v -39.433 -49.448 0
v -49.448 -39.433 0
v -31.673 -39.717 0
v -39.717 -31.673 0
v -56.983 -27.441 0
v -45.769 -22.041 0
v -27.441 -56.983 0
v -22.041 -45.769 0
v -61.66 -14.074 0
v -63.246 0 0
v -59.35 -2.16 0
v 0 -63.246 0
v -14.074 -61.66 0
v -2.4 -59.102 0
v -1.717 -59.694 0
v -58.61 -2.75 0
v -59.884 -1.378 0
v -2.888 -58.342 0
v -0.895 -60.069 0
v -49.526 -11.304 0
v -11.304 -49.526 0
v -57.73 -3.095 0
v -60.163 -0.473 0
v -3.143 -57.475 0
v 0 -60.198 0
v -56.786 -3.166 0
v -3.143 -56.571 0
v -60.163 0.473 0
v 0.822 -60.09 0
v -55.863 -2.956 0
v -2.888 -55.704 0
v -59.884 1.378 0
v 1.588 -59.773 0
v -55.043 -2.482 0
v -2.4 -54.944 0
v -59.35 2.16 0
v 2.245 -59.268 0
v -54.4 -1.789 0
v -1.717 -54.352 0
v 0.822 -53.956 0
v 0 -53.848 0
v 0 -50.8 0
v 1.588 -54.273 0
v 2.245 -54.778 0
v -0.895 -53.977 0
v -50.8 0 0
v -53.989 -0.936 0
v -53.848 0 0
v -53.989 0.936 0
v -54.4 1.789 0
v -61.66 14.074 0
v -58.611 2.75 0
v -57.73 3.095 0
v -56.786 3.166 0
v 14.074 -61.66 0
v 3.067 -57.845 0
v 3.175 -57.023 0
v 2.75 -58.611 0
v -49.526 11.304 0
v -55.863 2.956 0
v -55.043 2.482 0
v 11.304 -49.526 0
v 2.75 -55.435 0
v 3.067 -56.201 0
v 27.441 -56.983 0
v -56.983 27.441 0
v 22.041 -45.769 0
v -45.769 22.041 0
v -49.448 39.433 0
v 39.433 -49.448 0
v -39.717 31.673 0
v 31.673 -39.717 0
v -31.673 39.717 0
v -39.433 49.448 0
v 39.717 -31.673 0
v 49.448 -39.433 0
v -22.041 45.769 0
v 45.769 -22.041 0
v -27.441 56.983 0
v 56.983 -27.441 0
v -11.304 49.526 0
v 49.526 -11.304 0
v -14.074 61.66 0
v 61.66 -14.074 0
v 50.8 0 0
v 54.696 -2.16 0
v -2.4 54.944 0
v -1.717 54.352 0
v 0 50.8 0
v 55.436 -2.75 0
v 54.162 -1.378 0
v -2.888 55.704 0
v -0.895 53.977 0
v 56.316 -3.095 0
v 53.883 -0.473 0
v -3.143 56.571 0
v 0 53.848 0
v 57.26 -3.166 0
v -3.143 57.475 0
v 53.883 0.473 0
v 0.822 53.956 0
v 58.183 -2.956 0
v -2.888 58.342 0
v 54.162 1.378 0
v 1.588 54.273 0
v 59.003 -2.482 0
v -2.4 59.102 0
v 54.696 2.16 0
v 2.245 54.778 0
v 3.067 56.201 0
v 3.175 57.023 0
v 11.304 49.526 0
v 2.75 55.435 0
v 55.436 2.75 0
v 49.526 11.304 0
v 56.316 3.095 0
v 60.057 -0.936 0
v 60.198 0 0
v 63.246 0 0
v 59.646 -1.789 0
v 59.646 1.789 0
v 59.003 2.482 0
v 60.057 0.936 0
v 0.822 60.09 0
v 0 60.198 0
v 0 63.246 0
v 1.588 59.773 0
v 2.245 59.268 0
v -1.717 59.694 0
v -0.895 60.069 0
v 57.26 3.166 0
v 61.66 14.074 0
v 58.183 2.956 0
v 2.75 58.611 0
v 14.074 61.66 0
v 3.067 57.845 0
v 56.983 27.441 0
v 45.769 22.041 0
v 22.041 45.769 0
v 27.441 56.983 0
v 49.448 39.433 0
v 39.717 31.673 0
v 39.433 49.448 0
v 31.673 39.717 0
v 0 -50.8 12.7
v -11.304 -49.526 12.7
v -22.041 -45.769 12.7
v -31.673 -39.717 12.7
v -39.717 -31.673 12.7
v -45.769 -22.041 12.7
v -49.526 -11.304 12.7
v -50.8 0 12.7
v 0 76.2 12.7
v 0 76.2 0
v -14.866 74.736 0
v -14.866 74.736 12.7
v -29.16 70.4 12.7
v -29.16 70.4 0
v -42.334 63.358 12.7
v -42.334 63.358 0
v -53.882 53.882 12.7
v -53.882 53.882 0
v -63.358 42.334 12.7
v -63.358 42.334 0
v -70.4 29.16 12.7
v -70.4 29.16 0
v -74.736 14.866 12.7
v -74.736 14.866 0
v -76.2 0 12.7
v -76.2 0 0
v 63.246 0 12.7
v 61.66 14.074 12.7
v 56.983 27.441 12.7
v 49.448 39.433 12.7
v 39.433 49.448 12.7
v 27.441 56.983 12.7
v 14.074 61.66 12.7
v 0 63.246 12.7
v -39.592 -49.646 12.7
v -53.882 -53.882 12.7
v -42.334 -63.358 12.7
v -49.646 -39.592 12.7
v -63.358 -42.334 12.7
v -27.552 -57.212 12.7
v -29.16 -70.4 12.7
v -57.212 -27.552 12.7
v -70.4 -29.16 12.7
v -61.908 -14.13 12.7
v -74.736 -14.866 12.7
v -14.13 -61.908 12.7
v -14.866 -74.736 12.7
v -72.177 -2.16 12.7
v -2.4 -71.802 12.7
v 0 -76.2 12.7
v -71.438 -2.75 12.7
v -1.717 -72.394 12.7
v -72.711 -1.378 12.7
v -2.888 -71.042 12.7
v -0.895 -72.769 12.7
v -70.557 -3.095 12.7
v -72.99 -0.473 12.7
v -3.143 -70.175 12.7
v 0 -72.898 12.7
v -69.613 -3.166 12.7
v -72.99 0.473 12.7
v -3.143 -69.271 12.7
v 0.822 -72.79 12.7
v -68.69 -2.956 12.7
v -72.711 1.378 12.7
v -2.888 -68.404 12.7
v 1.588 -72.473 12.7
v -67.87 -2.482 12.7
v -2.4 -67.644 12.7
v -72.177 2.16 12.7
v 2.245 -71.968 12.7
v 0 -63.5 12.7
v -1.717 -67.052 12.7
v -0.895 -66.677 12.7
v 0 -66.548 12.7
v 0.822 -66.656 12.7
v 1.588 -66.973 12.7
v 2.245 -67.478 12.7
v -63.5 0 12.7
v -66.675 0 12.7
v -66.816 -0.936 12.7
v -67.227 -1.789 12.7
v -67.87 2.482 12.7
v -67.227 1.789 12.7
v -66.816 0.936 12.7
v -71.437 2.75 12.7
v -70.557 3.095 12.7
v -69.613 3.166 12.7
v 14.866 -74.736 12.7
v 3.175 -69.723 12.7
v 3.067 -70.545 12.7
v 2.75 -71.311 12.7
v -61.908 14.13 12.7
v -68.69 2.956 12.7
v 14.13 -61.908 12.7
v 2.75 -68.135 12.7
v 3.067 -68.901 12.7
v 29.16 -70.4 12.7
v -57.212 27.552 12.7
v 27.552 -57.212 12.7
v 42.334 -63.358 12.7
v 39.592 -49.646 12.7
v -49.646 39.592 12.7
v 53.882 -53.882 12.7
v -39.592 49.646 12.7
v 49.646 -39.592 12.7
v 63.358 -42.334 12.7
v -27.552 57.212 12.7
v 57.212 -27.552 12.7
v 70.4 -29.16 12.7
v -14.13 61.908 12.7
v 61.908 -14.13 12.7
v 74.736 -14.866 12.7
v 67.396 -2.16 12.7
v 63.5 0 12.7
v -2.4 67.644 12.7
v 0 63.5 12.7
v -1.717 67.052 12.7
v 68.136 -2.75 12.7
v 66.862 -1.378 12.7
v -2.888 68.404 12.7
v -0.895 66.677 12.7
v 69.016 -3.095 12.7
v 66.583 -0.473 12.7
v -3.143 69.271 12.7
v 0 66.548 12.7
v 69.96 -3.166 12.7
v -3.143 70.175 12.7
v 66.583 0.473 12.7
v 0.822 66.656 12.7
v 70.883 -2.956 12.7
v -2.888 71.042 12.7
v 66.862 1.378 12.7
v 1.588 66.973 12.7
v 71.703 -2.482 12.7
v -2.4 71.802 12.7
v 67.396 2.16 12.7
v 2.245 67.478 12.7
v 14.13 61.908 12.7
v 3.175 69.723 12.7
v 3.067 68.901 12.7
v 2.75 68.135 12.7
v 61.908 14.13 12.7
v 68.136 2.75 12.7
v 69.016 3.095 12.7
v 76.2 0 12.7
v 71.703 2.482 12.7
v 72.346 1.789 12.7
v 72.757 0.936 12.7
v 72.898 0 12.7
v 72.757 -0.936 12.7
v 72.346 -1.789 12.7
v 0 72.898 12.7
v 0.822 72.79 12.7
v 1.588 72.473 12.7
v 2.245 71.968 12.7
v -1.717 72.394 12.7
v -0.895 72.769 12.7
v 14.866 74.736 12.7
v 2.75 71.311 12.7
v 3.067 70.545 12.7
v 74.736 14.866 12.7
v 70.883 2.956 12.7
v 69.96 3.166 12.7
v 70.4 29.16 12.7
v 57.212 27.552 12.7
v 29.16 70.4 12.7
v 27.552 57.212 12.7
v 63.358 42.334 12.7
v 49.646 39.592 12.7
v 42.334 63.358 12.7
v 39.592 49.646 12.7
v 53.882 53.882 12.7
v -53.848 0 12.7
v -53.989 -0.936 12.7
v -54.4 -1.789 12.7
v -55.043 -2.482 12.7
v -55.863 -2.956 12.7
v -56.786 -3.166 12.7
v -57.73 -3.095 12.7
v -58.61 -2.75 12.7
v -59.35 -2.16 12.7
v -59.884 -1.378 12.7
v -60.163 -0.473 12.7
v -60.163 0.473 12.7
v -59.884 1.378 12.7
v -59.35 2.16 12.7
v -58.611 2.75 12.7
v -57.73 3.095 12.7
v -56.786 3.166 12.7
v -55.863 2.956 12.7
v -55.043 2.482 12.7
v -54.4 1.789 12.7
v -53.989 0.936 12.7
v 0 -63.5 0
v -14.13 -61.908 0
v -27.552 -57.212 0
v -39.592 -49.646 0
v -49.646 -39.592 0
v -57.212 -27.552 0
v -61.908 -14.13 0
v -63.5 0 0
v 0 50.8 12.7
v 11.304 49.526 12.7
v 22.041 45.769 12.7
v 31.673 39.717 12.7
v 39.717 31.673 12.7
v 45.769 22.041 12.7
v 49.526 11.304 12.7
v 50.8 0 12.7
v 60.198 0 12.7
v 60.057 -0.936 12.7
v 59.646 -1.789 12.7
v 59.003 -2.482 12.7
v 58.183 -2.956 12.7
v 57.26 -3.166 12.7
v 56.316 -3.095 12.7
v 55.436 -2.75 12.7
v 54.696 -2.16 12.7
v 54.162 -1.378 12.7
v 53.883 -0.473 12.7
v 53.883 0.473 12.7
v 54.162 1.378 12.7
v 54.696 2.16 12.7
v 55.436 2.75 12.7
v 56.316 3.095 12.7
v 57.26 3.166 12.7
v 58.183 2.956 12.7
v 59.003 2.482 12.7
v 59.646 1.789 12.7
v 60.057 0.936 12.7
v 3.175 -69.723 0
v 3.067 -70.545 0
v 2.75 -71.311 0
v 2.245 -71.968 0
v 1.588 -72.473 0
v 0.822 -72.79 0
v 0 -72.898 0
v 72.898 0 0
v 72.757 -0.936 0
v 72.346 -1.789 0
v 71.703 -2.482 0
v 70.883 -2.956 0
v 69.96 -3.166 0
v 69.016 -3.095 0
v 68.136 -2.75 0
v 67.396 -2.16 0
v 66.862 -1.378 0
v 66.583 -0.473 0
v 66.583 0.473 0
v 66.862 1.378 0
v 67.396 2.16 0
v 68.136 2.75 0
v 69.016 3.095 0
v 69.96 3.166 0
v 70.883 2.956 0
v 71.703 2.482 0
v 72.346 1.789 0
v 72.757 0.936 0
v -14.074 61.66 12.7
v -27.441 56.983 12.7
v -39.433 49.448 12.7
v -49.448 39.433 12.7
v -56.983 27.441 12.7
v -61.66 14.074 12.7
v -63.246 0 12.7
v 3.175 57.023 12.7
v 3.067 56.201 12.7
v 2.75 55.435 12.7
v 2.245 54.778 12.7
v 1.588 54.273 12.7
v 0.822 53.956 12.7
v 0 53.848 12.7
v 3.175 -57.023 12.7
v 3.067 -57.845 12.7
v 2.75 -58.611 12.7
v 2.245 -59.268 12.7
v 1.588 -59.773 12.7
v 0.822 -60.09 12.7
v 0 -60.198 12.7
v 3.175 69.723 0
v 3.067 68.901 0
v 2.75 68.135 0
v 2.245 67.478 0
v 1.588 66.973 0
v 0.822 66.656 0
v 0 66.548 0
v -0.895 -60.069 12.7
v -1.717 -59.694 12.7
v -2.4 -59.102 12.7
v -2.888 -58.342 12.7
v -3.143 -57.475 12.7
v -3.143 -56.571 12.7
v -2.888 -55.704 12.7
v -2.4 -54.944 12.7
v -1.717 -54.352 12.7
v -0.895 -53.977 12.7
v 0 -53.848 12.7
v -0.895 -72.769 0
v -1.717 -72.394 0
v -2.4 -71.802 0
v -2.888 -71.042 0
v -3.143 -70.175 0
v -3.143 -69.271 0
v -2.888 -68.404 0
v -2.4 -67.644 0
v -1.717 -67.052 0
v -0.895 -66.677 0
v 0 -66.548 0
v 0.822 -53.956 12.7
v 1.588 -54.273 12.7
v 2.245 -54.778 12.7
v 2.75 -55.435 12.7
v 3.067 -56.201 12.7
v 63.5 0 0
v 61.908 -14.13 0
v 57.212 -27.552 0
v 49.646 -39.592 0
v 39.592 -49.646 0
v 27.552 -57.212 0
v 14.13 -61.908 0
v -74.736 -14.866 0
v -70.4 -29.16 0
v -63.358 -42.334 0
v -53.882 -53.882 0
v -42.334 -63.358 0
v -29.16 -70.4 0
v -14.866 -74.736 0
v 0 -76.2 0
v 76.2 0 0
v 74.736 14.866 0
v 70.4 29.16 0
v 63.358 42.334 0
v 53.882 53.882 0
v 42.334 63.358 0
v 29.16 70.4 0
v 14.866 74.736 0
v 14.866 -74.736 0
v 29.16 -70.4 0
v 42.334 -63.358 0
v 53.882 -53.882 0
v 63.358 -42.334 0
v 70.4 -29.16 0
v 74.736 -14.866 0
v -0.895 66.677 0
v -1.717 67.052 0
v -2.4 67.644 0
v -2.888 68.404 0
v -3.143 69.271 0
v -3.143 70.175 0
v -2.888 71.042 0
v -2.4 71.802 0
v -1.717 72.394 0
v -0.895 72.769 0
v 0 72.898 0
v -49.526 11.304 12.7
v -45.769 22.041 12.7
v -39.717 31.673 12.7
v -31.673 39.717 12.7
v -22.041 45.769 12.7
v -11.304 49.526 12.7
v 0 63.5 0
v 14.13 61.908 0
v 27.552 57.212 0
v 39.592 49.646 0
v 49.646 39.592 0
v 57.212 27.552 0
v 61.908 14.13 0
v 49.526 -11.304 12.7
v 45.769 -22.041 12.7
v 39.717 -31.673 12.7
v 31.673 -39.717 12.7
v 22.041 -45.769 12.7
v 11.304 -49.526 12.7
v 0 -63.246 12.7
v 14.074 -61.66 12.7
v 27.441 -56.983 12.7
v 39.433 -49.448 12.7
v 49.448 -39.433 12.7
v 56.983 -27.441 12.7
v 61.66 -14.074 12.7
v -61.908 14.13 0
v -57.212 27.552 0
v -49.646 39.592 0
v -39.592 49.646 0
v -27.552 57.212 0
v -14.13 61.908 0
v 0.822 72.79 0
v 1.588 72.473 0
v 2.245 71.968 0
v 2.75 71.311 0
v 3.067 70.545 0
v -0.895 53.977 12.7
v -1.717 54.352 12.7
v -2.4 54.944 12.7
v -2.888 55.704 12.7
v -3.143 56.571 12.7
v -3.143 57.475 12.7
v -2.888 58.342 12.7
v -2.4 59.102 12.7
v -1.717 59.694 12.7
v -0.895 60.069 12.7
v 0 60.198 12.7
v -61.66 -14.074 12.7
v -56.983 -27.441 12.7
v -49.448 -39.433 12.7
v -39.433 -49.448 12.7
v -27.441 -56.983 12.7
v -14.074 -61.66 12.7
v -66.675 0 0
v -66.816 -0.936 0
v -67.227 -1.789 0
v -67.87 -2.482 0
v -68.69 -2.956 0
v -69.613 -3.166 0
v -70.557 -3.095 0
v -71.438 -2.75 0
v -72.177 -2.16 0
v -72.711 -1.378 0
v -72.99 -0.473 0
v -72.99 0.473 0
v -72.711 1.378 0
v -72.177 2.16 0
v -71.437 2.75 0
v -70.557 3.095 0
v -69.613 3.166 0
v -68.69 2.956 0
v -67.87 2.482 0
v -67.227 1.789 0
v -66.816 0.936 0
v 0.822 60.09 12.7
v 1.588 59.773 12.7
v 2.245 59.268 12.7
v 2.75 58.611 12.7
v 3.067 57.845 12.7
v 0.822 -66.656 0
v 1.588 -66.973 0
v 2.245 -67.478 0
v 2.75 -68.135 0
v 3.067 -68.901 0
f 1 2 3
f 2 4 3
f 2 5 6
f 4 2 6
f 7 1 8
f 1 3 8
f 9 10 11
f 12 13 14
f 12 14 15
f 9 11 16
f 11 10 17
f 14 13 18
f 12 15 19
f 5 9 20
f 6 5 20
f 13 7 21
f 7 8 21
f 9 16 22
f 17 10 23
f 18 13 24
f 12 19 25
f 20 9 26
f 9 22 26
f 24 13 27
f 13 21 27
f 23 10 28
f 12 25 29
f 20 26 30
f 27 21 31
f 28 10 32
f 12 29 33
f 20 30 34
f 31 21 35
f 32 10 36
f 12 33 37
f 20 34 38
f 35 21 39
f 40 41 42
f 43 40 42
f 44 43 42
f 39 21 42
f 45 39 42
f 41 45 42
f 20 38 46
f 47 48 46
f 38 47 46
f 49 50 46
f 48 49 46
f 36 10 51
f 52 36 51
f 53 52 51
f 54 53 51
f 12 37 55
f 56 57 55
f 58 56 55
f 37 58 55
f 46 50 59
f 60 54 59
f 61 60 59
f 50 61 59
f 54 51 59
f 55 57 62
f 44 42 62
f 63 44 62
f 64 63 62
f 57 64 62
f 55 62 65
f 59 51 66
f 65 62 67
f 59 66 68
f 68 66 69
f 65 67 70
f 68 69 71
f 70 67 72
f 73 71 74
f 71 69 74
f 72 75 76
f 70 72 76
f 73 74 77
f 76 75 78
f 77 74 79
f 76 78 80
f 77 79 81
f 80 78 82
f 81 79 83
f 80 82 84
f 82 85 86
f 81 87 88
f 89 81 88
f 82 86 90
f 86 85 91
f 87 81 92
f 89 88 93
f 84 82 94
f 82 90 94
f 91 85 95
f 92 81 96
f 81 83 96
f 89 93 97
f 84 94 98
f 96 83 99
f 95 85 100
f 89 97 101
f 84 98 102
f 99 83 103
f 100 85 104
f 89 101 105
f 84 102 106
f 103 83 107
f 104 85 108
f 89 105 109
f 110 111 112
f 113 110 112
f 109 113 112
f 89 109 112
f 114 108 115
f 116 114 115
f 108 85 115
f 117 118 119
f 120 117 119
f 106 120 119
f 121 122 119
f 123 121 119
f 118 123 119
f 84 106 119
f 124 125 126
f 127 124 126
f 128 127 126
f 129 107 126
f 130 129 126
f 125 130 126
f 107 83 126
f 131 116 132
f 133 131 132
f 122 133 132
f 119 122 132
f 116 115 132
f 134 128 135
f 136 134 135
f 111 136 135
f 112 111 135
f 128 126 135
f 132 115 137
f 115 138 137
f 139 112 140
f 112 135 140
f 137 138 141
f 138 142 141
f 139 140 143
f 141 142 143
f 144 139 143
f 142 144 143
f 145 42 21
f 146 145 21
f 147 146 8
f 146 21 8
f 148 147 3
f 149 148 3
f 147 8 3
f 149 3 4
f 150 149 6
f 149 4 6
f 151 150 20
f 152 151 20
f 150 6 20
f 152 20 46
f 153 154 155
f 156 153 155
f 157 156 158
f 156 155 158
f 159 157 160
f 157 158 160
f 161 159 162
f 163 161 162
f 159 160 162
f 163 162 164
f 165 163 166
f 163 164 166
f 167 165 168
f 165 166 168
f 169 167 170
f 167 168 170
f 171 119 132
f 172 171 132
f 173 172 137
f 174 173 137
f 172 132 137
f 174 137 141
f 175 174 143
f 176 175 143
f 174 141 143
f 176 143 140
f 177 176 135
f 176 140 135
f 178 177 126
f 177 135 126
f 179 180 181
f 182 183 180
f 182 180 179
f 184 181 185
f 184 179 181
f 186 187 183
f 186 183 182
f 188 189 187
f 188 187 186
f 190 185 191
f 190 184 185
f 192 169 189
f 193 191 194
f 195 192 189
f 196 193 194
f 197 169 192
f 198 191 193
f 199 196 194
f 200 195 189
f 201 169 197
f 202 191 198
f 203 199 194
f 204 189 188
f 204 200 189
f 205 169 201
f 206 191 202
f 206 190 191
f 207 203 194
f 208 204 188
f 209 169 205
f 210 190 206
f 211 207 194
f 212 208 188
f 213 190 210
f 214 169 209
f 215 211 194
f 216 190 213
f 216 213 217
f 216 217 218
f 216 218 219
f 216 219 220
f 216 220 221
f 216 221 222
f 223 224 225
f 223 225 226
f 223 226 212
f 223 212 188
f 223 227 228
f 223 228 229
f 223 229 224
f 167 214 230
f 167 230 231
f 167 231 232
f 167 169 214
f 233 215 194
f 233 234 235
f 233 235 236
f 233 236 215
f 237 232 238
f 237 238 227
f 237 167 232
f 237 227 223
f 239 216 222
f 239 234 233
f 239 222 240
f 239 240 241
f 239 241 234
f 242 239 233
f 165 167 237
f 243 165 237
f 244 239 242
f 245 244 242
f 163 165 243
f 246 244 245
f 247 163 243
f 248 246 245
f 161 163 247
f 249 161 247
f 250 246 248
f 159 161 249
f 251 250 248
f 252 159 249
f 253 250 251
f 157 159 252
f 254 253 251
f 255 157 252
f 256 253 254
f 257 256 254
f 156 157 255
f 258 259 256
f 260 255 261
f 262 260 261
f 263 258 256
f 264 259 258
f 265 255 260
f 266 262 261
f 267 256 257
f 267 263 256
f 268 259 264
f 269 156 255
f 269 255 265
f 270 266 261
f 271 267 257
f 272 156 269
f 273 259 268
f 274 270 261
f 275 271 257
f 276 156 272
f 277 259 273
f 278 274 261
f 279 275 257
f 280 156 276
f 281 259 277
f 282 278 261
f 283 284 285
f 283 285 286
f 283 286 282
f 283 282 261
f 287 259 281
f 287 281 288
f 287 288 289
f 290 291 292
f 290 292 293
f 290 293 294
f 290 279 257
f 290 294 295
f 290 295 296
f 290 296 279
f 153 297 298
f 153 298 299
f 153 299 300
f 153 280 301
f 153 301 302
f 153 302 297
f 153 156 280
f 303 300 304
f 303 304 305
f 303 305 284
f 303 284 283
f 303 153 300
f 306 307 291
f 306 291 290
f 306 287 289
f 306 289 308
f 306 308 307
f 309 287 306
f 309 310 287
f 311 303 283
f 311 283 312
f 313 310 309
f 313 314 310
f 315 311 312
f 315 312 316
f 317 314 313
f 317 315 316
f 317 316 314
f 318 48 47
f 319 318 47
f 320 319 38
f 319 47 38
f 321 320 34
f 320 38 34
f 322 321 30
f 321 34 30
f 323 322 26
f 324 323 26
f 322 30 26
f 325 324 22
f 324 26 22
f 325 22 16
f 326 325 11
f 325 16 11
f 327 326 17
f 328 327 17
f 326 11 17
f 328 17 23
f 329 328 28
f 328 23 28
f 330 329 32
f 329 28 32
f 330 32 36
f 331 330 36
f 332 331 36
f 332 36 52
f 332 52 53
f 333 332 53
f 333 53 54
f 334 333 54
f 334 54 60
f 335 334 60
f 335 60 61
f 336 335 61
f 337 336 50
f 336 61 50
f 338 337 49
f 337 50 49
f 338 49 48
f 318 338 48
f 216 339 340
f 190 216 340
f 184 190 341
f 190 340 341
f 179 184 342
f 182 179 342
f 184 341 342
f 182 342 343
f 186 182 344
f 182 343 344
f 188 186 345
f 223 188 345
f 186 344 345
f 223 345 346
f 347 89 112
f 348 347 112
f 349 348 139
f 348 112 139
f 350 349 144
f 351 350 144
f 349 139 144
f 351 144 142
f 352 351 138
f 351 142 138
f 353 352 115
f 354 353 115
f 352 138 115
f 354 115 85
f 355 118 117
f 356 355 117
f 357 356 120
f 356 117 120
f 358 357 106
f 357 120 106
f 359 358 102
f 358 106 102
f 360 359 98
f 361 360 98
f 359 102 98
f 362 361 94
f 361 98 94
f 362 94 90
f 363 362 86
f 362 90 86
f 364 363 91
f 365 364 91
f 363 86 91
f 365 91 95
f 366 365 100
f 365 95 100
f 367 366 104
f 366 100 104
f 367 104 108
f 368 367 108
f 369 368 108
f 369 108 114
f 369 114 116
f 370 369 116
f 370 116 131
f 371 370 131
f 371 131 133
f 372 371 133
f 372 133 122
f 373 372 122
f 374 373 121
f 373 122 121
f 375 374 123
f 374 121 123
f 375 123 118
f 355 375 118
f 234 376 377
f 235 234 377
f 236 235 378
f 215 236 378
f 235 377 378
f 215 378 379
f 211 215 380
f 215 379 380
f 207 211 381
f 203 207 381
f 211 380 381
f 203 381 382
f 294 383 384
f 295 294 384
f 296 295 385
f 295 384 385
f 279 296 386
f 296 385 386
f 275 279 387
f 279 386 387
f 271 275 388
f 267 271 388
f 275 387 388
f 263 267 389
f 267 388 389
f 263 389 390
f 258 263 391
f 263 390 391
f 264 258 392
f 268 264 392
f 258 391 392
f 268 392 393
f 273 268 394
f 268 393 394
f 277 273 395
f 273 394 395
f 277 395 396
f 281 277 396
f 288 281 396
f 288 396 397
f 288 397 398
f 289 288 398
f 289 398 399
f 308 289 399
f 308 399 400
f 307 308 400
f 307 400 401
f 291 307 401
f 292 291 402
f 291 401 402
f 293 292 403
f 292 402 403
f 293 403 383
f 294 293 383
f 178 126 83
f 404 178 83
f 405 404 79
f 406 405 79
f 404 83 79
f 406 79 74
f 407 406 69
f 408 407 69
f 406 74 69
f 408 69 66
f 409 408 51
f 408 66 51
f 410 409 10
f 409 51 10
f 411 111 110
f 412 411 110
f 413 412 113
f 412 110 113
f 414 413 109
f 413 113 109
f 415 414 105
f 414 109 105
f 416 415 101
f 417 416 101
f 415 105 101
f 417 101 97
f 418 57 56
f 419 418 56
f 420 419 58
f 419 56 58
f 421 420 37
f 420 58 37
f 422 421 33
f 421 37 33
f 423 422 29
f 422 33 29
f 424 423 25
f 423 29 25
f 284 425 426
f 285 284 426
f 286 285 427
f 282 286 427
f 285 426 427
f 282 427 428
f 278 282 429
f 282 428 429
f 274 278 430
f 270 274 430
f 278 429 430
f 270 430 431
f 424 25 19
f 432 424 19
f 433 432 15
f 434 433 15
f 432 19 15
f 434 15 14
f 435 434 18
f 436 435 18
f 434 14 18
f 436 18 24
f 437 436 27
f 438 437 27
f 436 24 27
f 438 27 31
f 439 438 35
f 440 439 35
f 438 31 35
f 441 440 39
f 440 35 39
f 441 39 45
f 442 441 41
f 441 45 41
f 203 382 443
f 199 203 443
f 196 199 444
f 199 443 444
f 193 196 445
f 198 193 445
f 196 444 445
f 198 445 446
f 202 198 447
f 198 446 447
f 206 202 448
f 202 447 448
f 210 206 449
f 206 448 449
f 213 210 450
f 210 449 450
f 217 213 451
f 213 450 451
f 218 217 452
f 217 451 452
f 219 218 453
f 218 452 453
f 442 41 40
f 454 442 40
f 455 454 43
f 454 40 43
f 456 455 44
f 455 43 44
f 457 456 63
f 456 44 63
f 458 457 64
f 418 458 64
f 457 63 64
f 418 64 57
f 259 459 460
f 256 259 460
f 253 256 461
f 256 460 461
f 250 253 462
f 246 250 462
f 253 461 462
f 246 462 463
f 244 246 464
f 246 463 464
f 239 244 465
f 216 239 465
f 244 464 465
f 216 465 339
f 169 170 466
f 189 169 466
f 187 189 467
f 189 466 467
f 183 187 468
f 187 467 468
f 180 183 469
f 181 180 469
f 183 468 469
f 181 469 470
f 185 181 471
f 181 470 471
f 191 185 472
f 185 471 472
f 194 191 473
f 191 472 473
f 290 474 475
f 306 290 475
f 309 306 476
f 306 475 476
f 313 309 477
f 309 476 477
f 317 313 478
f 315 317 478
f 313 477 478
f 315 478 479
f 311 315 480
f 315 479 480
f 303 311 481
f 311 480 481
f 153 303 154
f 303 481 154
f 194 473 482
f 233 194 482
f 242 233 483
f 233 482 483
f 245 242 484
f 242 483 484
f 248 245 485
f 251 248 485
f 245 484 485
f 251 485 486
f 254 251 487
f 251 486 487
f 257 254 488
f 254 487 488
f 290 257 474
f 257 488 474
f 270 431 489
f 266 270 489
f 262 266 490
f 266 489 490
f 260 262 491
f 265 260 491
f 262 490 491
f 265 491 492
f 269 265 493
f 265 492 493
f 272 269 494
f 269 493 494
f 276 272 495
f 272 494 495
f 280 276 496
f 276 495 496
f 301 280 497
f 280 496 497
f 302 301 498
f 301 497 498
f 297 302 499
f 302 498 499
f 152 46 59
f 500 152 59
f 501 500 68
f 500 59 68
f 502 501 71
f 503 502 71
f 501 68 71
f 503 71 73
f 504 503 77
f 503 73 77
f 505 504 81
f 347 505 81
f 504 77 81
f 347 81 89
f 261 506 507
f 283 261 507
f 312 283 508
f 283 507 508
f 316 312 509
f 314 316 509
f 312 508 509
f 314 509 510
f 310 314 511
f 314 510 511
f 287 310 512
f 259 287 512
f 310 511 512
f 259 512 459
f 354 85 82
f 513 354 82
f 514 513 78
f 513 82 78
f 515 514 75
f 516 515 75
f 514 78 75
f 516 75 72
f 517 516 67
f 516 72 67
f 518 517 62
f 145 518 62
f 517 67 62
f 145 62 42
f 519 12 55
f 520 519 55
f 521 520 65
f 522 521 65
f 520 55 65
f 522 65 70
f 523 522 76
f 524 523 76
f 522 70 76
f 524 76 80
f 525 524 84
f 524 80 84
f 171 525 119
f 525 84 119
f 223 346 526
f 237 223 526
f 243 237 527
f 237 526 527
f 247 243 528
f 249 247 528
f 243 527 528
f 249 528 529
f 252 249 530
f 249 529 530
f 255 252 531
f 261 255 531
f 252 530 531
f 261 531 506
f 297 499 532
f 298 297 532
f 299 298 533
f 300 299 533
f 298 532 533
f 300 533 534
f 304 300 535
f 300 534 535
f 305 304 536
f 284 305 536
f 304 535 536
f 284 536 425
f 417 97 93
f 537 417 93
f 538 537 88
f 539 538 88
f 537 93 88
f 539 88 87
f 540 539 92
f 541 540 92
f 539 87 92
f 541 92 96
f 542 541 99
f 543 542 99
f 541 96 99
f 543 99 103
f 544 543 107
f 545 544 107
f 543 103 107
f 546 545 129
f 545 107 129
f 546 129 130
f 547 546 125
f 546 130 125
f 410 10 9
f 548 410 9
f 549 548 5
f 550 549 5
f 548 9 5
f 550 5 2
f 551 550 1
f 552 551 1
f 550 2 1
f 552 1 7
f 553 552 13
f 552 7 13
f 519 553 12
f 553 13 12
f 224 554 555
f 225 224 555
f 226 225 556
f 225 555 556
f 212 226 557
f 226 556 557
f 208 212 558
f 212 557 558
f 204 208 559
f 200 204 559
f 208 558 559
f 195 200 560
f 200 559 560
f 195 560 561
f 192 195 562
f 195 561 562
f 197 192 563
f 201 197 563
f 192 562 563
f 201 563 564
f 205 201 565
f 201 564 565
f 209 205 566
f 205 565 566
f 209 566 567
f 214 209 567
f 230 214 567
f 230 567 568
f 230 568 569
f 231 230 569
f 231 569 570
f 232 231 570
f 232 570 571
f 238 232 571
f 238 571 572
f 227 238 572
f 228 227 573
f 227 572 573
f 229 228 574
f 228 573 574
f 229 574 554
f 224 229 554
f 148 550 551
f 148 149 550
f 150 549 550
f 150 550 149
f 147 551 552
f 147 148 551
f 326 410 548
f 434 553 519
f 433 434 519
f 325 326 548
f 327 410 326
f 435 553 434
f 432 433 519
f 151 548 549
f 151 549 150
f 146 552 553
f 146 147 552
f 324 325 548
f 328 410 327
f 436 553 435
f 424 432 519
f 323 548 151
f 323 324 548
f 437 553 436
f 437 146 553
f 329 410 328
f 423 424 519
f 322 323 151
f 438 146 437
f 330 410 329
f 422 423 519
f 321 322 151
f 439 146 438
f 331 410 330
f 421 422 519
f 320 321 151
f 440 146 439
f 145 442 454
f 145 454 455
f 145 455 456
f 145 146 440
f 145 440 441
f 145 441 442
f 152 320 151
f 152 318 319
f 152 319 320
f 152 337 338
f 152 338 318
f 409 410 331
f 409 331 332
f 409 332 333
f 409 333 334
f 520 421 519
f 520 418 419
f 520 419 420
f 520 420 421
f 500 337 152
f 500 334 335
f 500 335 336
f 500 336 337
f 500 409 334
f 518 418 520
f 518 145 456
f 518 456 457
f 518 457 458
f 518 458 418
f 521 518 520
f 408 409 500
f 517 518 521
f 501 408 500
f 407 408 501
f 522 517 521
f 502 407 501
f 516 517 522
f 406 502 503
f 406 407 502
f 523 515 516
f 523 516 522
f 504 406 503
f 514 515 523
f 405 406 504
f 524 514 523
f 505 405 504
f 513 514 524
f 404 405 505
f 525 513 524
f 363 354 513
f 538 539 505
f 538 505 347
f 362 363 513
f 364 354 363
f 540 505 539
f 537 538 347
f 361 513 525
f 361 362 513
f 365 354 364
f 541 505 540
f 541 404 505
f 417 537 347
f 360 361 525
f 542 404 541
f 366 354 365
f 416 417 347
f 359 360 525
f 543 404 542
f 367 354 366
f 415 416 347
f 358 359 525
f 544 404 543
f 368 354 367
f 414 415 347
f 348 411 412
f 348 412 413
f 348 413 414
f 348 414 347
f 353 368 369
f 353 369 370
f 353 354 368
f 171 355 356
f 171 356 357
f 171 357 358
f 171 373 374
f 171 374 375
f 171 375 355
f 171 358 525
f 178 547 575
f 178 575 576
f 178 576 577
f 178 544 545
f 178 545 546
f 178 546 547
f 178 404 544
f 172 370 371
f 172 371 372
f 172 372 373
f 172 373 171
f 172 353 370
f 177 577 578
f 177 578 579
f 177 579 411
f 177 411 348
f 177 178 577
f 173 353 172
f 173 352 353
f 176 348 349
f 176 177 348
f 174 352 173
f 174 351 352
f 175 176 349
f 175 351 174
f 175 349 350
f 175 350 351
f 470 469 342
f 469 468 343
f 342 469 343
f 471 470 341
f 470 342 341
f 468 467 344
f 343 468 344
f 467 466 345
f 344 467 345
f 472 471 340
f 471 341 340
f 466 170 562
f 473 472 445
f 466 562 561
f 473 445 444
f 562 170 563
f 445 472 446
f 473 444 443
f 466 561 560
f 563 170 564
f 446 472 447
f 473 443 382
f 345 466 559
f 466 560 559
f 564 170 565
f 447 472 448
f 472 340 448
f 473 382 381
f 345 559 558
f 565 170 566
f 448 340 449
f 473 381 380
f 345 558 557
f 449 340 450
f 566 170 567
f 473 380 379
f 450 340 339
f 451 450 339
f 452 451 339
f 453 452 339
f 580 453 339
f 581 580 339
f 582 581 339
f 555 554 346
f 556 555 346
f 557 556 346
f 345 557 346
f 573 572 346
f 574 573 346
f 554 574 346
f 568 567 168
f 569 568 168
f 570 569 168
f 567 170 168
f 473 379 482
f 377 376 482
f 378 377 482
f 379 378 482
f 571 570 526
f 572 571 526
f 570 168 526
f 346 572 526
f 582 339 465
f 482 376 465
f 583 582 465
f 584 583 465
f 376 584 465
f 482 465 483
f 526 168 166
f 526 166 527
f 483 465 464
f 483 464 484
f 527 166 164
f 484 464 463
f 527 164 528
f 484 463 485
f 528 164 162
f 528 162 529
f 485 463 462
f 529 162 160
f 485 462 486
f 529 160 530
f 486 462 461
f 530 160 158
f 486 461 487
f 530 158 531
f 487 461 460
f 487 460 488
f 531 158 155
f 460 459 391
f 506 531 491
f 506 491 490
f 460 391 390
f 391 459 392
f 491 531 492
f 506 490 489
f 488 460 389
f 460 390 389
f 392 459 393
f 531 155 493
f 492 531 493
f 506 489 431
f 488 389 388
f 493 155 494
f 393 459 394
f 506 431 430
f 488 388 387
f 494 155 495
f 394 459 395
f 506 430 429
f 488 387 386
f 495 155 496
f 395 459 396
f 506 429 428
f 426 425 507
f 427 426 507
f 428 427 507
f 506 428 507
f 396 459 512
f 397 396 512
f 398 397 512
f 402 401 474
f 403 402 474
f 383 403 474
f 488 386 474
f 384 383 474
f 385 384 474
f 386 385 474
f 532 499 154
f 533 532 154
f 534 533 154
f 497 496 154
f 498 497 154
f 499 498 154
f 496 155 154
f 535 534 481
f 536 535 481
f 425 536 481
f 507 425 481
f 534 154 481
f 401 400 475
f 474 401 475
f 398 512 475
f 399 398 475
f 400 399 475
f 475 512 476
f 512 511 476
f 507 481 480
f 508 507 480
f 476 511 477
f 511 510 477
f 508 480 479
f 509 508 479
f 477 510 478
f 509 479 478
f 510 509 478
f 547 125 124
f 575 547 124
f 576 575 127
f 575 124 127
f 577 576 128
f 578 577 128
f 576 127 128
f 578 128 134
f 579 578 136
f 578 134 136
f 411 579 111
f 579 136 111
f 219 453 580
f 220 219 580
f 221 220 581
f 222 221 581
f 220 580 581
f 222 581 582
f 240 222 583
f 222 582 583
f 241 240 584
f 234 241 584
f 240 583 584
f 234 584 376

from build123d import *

# Parameters (mm, degrees)
F1_DEPTH = 12.7


with BuildPart() as f1:
    # F0 (on Top) → F1 (new body)
    with BuildSketch(Plane.XY):
        with BuildLine():
            Line((60.198, 0), (63.246, 0))
            ThreePointArc((63.246, 0), (44.7216754829, 44.7216754829), (0, 63.246))
            Line((0, 63.246), (0, 60.198))
            ThreePointArc((0, 60.198), (2.2450640303, 59.2680640303), (3.175, 57.023))
            ThreePointArc((3.175, 57.023), (2.2450640303, 54.7779359697), (0, 53.848))
            Line((0, 53.848), (0, 50.8))
            ThreePointArc((0, 50.8), (35.9210244843, 35.9210244843), (50.8, 0))
            Line((50.8, 0), (53.848, 0))
            ThreePointArc((53.848, 0), (57.023, 3.175), (60.198, 0))
        make_face()
        with BuildLine():
            Line((0, 60.198), (0, 63.246))
            ThreePointArc((0, 63.246), (-44.7216754829, 44.7216754829), (-63.246, 0))
            Line((-63.246, 0), (-60.198, 0))
            ThreePointArc((-60.198, 0), (-57.023, 3.175), (-53.848, 0))
            Line((-53.848, 0), (-50.8, 0))
            ThreePointArc((-50.8, 0), (-35.9210244843, 35.9210244843), (0, 50.8))
            Line((0, 50.8), (0, 53.848))
            ThreePointArc((0, 53.848), (-3.175, 57.023), (0, 60.198))
        make_face()
        with BuildLine():
            ThreePointArc((0, -63.246), (44.7216754829, -44.7216754829), (63.246, 0))
            Line((63.246, 0), (60.198, 0))
            ThreePointArc((60.198, 0), (57.023, -3.175), (53.848, 0))
            Line((53.848, 0), (50.8, 0))
            ThreePointArc((50.8, 0), (35.9210244843, -35.9210244843), (0, -50.8))
            Line((0, -50.8), (0, -53.848))
            ThreePointArc((0, -53.848), (2.2450640303, -54.7779359697), (3.175, -57.023))
            ThreePointArc((3.175, -57.023), (2.2450640303, -59.2680640303), (0, -60.198))
            Line((0, -60.198), (0, -63.246))
        make_face()
        with BuildLine():
            ThreePointArc((-63.246, 0), (-44.7216754829, -44.7216754829), (0, -63.246))
            Line((0, -63.246), (0, -60.198))
            ThreePointArc((0, -60.198), (-3.175, -57.023), (0, -53.848))
            Line((0, -53.848), (0, -50.8))
            ThreePointArc((0, -50.8), (-35.9210244843, -35.9210244843), (-50.8, 0))
            Line((-50.8, 0), (-53.848, 0))
            ThreePointArc((-53.848, 0), (-57.023, -3.175), (-60.198, 0))
            Line((-60.198, 0), (-63.246, 0))
        make_face()
    extrude(amount=F1_DEPTH)


with BuildPart() as f1b:
    # F0 (on Top) → F1, piece 2 (new body)
    with BuildSketch(Plane.XY):
        with BuildLine():
            Line((72.898, 0), (76.2, 0))
            ThreePointArc((76.2, 0), (53.8815367264, 53.8815367264), (0, 76.2))
            Line((0, 76.2), (0, 72.898))
            ThreePointArc((0, 72.898), (2.2450640303, 71.9680640303), (3.175, 69.723))
            ThreePointArc((3.175, 69.723), (2.2450640303, 67.4779359697), (0, 66.548))
            Line((0, 66.548), (0, 63.5))
            ThreePointArc((0, 63.5), (44.9012806053, 44.9012806053), (63.5, 0))
            Line((63.5, 0), (66.548, 0))
            ThreePointArc((66.548, 0), (69.723, 3.175), (72.898, 0))
        make_face()
        with BuildLine():
            Line((0, 72.898), (0, 76.2))
            ThreePointArc((0, 76.2), (-53.8815367264, 53.8815367264), (-76.2, 0))
            Line((-76.2, 0), (-73.025, 0))
            ThreePointArc((-73.025, 0), (-69.85, 3.175), (-66.675, 0))
            Line((-66.675, 0), (-63.5, 0))
            ThreePointArc((-63.5, 0), (-44.9012806053, 44.9012806053), (0, 63.5))
            Line((0, 63.5), (0, 66.548))
            ThreePointArc((0, 66.548), (-3.175, 69.723), (0, 72.898))
        make_face()
        with BuildLine():
            ThreePointArc((-76.2, 0), (-53.8815367264, -53.8815367264), (0, -76.2))
            Line((0, -76.2), (0, -72.898))
            ThreePointArc((0, -72.898), (-3.175, -69.723), (0, -66.548))
            Line((0, -66.548), (0, -63.5))
            ThreePointArc((0, -63.5), (-44.9012806053, -44.9012806053), (-63.5, 0))
            Line((-63.5, 0), (-66.675, 0))
            ThreePointArc((-66.675, 0), (-69.85, -3.175), (-73.025, 0))
            Line((-73.025, 0), (-76.2, 0))
        make_face()
        with BuildLine():
            ThreePointArc((0, -76.2), (53.8815367264, -53.8815367264), (76.2, 0))
            Line((76.2, 0), (72.898, 0))
            ThreePointArc((72.898, 0), (69.723, -3.175), (66.548, 0))
            Line((66.548, 0), (63.5, 0))
            ThreePointArc((63.5, 0), (44.9012806053, -44.9012806053), (0, -63.5))
            Line((0, -63.5), (0, -66.548))
            ThreePointArc((0, -66.548), (2.2450640303, -67.4779359697), (3.175, -69.723))
            ThreePointArc((3.175, -69.723), (2.2450640303, -71.9680640303), (0, -72.898))
            Line((0, -72.898), (0, -76.2))
        make_face()
    extrude(amount=F1_DEPTH)


solid = Compound([f1.part, f1b.part])
